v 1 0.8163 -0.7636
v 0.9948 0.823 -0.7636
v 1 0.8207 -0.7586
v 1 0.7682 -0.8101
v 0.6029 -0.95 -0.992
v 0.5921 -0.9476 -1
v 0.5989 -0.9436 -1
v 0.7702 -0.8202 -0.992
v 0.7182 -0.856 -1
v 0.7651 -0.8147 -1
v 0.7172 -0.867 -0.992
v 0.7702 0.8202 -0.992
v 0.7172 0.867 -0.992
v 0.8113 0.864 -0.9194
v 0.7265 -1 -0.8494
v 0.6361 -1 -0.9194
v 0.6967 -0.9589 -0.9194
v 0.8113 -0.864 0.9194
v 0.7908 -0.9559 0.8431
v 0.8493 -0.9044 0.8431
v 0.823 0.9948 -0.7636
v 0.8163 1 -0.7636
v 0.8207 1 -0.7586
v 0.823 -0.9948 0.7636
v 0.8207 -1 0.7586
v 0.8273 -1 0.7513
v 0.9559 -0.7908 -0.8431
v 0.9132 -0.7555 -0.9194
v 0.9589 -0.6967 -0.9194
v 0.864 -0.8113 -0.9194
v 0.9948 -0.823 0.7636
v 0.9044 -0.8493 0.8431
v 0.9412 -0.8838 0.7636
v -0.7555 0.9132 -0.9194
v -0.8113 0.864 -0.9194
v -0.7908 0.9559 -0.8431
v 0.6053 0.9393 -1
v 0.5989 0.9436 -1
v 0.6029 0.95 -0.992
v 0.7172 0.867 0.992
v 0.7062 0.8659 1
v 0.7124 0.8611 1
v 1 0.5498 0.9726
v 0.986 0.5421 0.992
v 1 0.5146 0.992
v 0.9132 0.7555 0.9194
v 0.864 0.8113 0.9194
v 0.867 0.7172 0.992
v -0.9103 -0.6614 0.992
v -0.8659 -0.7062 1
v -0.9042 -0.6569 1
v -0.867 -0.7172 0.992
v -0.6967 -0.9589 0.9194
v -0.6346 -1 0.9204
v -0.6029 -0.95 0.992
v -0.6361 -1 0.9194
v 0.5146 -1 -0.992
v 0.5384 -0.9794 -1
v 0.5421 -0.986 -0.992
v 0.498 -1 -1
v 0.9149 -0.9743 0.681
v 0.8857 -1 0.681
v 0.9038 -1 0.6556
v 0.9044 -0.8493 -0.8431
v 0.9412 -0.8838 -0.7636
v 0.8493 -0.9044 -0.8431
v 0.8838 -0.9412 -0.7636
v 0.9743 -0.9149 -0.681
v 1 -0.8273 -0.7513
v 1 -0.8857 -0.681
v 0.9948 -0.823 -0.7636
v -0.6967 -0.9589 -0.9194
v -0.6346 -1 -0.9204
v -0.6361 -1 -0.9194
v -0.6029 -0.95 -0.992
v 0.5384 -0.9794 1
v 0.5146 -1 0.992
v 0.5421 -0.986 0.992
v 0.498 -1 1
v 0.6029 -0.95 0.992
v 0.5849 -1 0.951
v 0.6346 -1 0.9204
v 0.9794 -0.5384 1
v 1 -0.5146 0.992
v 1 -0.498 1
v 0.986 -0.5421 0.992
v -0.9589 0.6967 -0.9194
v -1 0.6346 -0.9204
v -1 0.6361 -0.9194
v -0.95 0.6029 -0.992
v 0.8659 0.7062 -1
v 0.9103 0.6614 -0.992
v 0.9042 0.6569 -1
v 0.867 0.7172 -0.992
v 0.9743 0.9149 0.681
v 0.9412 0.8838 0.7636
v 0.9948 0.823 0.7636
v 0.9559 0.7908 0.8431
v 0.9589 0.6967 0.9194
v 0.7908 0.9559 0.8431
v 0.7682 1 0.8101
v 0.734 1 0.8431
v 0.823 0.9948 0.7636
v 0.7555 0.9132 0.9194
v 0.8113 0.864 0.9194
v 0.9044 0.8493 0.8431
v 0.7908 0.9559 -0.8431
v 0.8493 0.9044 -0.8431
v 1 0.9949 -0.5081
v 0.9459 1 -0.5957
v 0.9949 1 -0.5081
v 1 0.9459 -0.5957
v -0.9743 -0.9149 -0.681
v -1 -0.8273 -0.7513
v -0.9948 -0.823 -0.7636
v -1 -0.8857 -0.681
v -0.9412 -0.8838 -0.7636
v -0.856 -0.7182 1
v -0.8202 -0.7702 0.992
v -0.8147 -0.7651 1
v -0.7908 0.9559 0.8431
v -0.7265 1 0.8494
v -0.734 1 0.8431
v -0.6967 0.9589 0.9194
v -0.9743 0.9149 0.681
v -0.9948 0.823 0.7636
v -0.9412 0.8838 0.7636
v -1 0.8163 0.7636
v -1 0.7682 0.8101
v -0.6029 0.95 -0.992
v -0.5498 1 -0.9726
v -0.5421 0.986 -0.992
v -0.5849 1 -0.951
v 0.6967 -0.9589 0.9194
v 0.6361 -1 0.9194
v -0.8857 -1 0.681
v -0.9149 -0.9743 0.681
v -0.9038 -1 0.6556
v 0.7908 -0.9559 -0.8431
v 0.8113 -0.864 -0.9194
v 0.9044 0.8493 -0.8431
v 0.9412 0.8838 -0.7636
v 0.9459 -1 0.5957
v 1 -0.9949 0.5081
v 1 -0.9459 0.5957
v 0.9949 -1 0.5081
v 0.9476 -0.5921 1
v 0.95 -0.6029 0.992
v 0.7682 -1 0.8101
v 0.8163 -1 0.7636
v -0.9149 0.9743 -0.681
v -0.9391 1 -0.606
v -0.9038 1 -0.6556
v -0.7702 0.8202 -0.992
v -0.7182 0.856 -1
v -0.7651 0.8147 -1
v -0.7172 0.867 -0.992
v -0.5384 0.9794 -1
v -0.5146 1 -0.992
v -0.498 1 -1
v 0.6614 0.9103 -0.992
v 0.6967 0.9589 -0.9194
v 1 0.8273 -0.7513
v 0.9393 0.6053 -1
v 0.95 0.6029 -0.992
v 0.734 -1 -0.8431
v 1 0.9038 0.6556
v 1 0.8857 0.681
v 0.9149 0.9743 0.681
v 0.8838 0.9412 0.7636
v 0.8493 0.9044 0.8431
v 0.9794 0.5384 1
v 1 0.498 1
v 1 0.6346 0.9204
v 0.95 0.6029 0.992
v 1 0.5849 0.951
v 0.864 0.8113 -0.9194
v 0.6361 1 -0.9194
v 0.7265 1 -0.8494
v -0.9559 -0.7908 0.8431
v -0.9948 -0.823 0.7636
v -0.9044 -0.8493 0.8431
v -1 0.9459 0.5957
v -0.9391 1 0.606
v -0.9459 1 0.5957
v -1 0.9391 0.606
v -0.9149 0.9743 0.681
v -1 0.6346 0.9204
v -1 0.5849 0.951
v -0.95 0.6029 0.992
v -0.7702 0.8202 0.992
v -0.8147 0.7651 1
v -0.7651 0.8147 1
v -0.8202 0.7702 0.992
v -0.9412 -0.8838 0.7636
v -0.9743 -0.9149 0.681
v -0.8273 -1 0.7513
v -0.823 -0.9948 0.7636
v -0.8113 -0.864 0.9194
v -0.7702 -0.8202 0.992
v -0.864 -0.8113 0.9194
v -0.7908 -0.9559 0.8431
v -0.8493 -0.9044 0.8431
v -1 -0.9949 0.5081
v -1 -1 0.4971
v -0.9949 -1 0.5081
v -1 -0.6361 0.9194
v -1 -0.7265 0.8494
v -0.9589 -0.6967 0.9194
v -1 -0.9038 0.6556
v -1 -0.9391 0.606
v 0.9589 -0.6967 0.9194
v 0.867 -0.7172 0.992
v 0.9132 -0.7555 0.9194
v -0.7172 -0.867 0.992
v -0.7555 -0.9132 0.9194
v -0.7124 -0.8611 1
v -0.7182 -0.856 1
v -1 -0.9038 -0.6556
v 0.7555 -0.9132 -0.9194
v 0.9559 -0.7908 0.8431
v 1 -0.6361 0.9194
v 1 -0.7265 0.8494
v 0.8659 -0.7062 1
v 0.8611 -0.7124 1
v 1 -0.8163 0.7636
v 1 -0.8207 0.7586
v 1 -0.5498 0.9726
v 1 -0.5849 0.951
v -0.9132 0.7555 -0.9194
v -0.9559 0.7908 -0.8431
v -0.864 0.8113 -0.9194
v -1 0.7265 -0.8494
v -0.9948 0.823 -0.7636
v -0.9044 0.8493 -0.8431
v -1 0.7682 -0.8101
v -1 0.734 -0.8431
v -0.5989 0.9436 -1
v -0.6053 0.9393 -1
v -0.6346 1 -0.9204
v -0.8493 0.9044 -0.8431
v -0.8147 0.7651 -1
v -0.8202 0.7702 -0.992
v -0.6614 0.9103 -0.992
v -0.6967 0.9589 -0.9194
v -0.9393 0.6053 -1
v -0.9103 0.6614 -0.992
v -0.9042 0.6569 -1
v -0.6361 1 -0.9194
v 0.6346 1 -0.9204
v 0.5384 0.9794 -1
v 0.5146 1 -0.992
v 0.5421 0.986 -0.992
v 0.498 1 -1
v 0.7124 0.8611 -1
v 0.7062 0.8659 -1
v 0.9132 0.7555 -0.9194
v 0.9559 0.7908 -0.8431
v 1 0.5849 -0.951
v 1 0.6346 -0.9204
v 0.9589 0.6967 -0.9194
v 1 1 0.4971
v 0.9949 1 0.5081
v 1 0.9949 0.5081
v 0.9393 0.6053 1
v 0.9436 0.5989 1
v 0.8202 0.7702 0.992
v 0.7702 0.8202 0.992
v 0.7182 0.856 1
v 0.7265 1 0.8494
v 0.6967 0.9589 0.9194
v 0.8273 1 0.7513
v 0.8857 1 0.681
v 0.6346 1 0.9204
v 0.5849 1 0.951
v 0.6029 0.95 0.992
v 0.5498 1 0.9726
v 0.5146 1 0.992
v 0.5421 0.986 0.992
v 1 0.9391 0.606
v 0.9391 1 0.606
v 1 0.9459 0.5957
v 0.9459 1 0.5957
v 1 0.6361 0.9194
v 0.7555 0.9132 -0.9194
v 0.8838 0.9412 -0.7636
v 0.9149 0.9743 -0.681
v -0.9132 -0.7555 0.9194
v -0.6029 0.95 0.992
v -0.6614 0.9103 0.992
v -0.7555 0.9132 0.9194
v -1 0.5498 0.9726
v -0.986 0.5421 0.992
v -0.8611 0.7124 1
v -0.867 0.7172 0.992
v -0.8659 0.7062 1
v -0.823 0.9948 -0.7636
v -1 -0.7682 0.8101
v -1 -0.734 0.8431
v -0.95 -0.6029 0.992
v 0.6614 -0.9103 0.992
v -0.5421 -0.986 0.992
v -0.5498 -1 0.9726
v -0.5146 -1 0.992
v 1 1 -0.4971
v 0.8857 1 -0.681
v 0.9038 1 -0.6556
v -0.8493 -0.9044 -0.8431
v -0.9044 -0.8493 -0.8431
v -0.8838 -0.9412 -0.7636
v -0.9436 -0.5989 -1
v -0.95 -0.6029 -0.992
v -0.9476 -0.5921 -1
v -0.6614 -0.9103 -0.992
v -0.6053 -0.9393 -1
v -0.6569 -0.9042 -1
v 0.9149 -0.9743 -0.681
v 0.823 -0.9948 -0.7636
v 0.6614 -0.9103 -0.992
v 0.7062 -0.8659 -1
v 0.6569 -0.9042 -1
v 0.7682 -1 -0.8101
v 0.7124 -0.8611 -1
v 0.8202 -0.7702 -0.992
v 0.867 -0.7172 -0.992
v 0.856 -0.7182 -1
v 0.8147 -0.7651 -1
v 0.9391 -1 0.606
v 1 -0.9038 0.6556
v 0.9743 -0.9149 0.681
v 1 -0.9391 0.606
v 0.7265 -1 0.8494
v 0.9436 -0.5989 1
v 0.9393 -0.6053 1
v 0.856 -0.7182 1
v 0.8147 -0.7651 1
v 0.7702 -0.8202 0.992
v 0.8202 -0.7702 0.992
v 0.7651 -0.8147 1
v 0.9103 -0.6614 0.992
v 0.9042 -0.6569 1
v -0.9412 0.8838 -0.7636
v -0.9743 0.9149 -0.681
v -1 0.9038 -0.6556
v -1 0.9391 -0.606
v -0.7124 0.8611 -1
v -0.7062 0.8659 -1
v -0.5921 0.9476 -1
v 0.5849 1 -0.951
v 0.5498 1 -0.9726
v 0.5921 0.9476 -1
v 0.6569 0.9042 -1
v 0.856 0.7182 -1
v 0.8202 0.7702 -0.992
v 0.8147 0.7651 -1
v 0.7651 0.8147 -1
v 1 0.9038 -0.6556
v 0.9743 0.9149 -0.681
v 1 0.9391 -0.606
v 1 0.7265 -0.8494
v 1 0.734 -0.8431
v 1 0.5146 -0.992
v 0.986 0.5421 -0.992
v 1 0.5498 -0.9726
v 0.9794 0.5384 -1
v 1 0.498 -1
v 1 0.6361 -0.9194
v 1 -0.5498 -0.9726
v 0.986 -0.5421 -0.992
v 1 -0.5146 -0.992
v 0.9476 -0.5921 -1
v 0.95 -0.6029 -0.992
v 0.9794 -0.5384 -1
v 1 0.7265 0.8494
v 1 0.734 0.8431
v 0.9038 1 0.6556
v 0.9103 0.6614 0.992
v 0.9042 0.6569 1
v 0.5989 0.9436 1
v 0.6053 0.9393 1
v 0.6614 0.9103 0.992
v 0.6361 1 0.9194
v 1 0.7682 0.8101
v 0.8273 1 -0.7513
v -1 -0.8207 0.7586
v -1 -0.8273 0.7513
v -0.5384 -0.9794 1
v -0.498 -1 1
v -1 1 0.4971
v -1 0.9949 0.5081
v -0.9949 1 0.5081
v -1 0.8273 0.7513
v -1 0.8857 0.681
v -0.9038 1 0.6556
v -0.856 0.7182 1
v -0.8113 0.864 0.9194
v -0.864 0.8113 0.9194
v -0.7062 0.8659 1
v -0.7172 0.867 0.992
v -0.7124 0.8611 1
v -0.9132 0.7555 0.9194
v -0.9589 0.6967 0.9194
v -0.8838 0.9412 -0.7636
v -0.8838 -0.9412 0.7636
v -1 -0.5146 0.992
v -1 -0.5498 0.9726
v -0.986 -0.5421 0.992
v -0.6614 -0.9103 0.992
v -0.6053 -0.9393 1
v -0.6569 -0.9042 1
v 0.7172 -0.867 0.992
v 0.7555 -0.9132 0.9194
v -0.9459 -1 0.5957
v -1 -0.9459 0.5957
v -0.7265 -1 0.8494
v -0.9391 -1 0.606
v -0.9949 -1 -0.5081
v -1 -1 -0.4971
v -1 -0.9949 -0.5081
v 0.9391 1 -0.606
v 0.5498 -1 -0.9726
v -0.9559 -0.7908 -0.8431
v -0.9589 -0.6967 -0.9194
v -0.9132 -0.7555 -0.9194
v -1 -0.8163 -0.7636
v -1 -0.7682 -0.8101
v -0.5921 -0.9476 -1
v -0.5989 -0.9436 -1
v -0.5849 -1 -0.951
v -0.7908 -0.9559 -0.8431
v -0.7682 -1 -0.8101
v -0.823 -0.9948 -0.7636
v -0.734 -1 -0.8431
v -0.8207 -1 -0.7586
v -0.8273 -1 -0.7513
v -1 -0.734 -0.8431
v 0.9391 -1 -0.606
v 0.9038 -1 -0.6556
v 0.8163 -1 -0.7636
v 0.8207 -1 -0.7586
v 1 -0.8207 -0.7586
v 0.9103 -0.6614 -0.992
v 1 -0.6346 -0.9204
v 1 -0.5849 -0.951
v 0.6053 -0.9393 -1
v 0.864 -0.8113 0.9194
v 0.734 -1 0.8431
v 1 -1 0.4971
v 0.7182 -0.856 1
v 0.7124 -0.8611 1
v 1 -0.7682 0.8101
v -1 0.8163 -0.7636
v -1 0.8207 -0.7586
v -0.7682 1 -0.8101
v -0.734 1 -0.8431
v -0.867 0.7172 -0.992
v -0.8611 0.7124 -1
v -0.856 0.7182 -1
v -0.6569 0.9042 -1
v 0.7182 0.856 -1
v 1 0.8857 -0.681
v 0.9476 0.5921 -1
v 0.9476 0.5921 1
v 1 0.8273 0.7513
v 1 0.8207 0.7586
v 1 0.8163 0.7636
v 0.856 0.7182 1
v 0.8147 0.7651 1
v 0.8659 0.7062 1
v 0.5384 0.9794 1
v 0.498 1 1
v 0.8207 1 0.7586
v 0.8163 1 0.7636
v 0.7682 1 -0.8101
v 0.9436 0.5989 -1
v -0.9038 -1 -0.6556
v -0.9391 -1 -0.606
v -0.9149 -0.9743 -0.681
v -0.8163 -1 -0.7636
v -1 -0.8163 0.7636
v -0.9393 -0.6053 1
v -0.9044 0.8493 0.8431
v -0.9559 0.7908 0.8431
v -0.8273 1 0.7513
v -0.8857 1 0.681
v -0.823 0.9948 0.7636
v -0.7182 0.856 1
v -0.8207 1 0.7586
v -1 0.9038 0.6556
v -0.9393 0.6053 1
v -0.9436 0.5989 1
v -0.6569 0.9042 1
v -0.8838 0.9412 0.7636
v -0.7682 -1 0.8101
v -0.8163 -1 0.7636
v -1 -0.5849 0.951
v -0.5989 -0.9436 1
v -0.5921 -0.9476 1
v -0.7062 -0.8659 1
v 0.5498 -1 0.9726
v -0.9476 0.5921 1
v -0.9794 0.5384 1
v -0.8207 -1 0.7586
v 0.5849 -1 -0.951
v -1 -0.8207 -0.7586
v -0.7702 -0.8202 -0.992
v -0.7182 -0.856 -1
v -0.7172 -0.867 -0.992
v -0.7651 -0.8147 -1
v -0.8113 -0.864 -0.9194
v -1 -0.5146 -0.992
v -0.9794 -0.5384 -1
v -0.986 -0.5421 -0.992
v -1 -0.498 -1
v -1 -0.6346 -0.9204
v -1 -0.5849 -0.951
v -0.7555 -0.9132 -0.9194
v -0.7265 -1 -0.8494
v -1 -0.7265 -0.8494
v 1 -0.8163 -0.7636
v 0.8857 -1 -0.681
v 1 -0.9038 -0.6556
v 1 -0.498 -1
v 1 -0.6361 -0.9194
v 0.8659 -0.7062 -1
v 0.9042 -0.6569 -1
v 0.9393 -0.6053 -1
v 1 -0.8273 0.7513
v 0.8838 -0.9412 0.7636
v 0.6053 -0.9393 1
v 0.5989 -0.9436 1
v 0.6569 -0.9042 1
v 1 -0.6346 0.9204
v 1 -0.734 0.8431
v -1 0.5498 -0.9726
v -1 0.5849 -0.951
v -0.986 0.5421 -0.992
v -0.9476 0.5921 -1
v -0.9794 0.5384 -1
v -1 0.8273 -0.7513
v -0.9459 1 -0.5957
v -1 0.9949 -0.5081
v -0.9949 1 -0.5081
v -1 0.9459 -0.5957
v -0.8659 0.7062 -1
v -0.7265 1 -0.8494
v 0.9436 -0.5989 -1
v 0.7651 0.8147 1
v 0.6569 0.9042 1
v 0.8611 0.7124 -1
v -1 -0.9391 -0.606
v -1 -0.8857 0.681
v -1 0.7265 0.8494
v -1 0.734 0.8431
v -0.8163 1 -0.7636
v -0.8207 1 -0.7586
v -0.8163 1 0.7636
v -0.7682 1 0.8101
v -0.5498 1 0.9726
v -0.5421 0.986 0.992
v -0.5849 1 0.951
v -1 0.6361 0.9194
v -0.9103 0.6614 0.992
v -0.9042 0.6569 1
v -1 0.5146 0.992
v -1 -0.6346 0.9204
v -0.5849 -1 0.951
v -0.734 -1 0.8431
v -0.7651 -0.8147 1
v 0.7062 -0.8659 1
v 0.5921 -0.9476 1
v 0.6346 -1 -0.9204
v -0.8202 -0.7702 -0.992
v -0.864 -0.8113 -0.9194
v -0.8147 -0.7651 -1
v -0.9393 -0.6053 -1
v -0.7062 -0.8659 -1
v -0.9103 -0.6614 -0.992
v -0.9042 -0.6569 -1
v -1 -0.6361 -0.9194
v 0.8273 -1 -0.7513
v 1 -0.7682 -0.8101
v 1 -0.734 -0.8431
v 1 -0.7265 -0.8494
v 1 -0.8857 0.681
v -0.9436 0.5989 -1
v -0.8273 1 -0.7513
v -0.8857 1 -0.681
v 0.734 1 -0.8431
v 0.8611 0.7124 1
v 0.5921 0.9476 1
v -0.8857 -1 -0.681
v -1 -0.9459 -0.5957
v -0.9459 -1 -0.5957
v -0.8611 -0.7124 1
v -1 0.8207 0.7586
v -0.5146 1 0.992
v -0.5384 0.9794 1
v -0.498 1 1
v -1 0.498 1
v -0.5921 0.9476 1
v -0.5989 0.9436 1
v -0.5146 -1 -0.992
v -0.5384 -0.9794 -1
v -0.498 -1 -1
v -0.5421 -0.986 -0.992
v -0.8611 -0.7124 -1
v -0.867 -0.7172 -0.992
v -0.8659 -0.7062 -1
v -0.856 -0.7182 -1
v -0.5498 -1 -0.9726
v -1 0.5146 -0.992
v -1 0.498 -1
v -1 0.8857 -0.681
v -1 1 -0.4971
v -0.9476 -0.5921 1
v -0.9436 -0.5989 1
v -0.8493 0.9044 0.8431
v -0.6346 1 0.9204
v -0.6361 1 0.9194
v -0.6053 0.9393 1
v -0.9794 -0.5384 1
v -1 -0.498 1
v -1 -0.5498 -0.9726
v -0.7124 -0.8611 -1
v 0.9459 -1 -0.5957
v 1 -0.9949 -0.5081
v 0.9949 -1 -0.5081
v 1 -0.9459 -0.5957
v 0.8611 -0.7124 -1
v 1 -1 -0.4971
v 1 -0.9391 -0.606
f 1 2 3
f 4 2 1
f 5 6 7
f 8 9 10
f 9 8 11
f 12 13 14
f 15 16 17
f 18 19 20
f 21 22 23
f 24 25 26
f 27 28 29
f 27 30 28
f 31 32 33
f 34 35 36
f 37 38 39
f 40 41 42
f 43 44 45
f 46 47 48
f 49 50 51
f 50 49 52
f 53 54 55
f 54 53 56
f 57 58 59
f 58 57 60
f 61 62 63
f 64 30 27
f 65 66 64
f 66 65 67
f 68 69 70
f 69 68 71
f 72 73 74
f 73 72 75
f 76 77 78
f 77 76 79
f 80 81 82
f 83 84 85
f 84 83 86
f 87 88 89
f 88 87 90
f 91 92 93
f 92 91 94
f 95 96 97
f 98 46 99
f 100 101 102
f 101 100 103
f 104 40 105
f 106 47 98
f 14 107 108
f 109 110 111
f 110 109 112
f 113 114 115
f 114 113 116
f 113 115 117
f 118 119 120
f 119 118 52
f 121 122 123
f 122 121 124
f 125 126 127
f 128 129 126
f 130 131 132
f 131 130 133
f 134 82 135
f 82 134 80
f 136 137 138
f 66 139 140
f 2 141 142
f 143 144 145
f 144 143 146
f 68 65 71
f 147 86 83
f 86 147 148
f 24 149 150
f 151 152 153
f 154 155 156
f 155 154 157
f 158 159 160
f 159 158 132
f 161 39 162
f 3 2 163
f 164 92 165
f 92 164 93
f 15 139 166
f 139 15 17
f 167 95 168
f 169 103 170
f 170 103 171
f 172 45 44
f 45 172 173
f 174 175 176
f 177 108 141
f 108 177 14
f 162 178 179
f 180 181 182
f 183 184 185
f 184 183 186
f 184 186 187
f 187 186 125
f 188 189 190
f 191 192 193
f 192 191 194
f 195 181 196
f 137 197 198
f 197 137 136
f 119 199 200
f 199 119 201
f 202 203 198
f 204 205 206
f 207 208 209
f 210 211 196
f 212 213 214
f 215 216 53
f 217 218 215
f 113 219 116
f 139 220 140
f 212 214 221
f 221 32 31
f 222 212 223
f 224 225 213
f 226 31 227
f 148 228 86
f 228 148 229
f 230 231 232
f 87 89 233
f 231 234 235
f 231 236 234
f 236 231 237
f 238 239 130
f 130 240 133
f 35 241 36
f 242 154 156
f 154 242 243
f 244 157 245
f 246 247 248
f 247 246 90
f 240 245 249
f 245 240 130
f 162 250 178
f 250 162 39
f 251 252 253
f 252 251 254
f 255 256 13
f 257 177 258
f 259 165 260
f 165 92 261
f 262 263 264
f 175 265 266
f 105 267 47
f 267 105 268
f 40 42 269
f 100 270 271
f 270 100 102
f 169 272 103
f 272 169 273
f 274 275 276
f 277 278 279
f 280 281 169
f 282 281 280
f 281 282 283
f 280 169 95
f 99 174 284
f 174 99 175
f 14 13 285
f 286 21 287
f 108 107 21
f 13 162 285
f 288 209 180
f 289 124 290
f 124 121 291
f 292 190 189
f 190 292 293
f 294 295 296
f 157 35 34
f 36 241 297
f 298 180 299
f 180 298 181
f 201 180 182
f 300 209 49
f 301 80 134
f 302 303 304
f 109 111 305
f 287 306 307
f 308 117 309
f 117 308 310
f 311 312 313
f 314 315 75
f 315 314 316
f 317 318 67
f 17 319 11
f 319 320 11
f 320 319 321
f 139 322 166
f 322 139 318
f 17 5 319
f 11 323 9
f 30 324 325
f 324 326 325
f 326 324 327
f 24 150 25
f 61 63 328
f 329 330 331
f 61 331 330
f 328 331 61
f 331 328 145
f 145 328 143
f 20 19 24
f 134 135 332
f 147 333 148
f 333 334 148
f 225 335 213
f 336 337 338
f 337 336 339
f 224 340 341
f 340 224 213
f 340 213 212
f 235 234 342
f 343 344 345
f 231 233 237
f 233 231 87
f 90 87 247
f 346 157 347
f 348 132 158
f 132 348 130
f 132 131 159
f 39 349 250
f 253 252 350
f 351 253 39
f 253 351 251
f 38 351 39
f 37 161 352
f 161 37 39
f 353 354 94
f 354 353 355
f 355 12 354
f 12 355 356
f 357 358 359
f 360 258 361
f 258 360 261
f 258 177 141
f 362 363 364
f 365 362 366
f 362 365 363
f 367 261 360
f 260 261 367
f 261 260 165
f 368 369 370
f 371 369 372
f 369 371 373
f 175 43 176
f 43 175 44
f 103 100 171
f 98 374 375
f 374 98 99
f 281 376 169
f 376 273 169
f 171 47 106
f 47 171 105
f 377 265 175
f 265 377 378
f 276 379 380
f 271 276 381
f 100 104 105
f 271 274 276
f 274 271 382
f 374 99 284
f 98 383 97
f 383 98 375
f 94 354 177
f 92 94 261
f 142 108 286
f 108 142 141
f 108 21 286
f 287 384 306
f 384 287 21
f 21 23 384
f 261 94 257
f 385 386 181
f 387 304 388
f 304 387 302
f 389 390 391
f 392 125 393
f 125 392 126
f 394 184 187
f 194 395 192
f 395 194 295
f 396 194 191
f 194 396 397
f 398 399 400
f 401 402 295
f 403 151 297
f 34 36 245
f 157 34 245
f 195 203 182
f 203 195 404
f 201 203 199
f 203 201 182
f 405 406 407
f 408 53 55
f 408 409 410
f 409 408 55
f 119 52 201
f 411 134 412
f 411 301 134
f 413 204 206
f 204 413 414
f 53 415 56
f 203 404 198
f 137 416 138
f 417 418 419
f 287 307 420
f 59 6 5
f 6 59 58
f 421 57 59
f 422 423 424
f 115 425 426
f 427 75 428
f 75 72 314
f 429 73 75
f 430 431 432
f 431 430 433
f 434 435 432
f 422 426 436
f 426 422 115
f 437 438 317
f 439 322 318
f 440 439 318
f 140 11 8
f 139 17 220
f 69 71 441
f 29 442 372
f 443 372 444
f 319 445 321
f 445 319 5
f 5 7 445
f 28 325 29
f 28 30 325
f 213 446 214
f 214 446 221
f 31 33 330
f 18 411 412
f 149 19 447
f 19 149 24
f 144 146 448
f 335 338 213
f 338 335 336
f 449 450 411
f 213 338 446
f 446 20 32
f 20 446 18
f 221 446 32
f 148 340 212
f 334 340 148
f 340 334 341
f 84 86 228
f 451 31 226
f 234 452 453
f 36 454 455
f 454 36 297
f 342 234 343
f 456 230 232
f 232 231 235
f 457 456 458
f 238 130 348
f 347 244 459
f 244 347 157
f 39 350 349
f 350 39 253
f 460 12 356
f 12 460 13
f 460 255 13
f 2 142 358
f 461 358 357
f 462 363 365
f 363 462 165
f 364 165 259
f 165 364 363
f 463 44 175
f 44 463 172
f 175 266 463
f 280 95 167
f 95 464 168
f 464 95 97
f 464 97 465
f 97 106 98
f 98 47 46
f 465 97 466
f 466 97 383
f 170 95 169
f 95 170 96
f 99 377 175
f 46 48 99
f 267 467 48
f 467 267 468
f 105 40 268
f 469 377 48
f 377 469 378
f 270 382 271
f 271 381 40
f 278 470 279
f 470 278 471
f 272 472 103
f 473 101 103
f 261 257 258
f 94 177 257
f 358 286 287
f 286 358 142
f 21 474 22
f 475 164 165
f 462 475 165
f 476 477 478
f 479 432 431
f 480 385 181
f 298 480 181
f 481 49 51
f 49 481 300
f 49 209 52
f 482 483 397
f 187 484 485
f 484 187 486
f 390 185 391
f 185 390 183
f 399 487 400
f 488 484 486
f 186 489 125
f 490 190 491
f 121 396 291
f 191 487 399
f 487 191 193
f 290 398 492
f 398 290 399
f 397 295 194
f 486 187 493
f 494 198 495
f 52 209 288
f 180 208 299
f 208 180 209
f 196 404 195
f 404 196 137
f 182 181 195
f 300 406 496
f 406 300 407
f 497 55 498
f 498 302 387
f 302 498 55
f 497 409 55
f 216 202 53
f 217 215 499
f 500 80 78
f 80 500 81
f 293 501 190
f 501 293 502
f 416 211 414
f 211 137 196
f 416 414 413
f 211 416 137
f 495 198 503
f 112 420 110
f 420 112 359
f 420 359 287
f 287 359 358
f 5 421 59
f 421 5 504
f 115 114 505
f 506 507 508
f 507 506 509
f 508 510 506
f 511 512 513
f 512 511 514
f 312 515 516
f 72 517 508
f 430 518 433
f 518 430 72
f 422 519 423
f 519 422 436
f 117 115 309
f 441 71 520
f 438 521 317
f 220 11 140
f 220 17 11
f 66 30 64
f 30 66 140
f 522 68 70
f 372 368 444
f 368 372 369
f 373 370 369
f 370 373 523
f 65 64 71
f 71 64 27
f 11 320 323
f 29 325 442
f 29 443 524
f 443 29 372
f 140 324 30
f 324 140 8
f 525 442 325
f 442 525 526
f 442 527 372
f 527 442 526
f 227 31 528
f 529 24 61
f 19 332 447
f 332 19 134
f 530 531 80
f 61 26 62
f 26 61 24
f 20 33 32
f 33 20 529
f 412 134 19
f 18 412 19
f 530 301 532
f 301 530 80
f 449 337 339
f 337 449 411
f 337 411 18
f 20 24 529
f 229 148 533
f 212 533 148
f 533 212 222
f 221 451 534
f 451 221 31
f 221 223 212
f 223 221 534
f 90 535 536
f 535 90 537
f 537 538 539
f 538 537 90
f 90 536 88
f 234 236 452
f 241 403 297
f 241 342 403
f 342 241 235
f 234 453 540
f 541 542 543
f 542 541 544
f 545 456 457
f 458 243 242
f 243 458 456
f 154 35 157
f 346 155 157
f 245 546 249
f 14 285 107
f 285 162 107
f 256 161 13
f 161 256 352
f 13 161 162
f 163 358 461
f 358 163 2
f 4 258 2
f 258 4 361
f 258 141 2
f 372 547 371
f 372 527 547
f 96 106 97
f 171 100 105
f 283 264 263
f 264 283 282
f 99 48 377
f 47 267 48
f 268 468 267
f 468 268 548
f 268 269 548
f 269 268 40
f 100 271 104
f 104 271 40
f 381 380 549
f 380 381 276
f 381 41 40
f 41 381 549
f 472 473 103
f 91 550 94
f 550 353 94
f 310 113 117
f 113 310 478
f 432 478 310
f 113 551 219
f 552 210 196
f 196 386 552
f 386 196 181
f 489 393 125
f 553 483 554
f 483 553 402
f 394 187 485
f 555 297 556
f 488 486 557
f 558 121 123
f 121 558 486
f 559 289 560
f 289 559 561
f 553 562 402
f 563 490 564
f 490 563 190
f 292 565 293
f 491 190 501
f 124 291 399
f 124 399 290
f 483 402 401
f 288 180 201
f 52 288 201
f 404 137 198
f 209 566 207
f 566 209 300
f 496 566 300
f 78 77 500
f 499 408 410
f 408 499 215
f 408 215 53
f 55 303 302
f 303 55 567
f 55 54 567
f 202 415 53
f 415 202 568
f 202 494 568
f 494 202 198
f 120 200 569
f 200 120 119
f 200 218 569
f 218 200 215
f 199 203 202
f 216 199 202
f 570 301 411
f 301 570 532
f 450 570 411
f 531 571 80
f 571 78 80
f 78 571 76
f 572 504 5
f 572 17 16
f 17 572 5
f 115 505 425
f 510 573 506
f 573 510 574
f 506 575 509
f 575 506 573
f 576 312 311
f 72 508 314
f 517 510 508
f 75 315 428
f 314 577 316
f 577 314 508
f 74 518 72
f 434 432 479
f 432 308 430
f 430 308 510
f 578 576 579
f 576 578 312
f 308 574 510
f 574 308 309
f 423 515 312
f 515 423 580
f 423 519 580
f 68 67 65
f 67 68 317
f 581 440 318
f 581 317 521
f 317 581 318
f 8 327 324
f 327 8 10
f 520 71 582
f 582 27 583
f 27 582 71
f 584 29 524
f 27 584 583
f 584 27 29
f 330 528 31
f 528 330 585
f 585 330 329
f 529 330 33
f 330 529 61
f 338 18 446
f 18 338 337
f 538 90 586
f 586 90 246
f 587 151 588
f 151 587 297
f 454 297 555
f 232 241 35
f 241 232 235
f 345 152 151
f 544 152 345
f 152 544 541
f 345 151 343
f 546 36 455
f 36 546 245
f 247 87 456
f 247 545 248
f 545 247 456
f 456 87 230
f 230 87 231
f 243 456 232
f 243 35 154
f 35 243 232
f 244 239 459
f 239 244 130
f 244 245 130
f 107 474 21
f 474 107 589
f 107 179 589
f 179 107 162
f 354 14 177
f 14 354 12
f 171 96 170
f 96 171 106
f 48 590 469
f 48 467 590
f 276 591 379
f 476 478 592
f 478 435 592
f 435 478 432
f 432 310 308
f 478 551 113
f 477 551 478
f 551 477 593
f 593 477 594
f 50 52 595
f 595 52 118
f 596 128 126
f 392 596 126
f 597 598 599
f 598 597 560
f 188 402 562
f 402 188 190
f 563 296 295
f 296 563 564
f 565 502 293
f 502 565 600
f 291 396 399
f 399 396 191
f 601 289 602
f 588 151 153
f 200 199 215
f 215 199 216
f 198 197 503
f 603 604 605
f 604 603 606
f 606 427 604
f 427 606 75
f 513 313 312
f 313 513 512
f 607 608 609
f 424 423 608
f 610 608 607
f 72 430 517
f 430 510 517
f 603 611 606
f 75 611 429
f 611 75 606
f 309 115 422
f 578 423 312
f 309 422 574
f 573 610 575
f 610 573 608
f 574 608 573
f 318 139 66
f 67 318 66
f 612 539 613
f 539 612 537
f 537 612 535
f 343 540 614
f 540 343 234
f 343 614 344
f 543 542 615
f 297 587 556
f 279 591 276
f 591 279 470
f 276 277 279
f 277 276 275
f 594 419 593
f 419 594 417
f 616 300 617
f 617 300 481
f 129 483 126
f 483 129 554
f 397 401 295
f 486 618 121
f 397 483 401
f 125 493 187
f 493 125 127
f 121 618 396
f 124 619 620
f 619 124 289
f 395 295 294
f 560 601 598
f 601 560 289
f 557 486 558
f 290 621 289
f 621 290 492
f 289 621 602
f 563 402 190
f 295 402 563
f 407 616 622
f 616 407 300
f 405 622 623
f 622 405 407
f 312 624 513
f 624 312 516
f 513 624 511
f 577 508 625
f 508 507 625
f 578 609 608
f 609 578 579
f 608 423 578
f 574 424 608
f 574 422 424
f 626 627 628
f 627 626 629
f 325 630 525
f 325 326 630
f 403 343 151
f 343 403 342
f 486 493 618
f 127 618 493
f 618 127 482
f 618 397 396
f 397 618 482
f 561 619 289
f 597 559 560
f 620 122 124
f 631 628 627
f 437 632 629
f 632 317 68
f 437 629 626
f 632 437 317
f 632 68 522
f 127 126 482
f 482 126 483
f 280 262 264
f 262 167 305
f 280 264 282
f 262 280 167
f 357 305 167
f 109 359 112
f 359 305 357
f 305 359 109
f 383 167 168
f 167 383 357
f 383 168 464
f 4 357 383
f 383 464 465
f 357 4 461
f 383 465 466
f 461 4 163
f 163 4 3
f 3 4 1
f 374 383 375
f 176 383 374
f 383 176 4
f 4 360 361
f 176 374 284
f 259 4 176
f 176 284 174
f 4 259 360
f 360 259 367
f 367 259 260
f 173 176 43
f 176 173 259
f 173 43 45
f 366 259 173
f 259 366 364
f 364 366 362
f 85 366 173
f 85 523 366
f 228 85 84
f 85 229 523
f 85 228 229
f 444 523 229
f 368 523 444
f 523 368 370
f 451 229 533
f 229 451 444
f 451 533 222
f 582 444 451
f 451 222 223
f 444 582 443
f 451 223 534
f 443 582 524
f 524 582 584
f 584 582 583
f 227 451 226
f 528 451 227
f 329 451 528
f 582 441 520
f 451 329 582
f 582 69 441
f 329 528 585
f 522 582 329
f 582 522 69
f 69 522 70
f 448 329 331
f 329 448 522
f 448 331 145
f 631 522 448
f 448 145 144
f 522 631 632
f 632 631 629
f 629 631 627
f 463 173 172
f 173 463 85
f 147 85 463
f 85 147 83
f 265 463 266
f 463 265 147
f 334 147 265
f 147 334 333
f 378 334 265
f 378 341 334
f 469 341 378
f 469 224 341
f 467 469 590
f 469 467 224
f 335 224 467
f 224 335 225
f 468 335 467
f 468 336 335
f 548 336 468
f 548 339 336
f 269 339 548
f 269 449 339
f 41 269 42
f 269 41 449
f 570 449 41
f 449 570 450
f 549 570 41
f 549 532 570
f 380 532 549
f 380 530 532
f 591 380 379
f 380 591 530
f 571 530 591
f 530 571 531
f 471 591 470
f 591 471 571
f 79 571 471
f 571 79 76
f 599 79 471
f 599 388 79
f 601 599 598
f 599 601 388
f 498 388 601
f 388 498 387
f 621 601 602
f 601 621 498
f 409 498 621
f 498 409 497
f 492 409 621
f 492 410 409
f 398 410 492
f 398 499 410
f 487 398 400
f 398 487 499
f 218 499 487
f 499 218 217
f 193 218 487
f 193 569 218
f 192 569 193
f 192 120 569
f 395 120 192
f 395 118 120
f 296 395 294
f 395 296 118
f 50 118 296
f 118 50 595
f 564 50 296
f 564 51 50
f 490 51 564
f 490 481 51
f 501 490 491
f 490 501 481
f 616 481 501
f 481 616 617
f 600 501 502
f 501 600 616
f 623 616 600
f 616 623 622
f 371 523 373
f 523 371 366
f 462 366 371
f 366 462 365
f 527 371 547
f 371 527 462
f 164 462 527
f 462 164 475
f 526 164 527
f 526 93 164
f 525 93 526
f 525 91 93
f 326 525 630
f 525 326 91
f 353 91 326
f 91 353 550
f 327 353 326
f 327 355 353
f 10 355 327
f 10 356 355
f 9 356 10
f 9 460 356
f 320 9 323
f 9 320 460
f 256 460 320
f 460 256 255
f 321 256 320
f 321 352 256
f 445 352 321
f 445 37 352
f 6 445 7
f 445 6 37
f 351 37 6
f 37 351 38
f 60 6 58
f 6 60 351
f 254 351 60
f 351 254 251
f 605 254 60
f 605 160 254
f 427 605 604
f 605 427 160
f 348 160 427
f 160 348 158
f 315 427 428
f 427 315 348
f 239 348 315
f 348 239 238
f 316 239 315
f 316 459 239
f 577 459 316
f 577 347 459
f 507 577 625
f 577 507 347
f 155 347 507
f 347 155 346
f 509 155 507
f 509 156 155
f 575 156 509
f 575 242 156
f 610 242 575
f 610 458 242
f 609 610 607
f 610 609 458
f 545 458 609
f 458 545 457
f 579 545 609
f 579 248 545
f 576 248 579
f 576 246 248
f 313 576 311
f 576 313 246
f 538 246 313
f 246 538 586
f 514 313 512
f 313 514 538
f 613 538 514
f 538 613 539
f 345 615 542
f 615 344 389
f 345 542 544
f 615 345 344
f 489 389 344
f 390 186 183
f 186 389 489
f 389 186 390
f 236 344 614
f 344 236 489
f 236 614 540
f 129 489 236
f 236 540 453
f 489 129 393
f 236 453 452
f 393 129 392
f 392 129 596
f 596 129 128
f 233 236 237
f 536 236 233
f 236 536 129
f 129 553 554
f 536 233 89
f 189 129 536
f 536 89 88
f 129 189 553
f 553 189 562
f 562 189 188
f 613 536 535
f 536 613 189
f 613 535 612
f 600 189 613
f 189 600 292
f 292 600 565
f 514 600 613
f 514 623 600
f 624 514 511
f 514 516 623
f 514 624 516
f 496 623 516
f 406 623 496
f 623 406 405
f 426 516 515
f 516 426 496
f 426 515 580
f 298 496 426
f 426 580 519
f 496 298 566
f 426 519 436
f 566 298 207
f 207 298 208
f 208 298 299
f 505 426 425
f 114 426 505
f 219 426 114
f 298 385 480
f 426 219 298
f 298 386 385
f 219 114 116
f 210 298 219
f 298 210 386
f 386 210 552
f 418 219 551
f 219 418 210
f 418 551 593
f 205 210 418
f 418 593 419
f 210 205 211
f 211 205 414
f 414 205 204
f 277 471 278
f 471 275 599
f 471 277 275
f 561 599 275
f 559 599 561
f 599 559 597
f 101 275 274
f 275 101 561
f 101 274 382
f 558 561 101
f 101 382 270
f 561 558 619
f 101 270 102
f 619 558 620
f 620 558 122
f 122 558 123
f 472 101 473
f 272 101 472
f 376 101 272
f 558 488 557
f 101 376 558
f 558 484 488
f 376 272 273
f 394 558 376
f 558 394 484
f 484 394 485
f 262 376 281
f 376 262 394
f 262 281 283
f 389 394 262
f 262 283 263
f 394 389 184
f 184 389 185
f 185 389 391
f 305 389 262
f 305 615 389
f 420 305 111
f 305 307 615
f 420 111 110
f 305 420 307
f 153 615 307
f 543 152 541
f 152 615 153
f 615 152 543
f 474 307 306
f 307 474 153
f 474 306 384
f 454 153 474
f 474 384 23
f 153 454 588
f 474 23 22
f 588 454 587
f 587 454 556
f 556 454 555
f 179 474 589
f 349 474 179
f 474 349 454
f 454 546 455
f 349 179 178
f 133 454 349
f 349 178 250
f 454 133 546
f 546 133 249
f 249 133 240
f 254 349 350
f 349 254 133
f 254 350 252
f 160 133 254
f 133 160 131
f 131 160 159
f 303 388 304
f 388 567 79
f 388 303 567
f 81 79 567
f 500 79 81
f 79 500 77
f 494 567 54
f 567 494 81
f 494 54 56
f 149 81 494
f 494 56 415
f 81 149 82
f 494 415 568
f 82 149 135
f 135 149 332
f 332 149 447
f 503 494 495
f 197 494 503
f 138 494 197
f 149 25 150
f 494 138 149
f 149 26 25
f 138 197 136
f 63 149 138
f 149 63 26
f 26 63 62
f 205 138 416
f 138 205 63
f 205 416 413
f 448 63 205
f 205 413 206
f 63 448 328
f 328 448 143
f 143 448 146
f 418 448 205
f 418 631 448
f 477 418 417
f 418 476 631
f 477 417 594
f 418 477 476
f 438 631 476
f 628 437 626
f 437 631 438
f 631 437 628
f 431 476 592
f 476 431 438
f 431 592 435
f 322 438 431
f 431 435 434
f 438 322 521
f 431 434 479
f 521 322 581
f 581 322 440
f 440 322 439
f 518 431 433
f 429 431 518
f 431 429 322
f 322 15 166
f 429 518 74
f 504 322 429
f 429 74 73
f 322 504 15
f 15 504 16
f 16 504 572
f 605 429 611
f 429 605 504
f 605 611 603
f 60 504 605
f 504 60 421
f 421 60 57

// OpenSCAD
$fn = 100;
//difference(){
//sphere(r = 1.5);
//cube([2,2,2], center = true);
//cylinder(h = 4, d1 = 2, d2 = 0, center = true);
//}

intersection(){
sphere(r = 1.5);
cube([2,2,2], center = true);
}

//union(){
//cube([2,2,2], center = true);
//cylinder(h = 4, d1 = 2, d2 = 0, center = true);
//}
